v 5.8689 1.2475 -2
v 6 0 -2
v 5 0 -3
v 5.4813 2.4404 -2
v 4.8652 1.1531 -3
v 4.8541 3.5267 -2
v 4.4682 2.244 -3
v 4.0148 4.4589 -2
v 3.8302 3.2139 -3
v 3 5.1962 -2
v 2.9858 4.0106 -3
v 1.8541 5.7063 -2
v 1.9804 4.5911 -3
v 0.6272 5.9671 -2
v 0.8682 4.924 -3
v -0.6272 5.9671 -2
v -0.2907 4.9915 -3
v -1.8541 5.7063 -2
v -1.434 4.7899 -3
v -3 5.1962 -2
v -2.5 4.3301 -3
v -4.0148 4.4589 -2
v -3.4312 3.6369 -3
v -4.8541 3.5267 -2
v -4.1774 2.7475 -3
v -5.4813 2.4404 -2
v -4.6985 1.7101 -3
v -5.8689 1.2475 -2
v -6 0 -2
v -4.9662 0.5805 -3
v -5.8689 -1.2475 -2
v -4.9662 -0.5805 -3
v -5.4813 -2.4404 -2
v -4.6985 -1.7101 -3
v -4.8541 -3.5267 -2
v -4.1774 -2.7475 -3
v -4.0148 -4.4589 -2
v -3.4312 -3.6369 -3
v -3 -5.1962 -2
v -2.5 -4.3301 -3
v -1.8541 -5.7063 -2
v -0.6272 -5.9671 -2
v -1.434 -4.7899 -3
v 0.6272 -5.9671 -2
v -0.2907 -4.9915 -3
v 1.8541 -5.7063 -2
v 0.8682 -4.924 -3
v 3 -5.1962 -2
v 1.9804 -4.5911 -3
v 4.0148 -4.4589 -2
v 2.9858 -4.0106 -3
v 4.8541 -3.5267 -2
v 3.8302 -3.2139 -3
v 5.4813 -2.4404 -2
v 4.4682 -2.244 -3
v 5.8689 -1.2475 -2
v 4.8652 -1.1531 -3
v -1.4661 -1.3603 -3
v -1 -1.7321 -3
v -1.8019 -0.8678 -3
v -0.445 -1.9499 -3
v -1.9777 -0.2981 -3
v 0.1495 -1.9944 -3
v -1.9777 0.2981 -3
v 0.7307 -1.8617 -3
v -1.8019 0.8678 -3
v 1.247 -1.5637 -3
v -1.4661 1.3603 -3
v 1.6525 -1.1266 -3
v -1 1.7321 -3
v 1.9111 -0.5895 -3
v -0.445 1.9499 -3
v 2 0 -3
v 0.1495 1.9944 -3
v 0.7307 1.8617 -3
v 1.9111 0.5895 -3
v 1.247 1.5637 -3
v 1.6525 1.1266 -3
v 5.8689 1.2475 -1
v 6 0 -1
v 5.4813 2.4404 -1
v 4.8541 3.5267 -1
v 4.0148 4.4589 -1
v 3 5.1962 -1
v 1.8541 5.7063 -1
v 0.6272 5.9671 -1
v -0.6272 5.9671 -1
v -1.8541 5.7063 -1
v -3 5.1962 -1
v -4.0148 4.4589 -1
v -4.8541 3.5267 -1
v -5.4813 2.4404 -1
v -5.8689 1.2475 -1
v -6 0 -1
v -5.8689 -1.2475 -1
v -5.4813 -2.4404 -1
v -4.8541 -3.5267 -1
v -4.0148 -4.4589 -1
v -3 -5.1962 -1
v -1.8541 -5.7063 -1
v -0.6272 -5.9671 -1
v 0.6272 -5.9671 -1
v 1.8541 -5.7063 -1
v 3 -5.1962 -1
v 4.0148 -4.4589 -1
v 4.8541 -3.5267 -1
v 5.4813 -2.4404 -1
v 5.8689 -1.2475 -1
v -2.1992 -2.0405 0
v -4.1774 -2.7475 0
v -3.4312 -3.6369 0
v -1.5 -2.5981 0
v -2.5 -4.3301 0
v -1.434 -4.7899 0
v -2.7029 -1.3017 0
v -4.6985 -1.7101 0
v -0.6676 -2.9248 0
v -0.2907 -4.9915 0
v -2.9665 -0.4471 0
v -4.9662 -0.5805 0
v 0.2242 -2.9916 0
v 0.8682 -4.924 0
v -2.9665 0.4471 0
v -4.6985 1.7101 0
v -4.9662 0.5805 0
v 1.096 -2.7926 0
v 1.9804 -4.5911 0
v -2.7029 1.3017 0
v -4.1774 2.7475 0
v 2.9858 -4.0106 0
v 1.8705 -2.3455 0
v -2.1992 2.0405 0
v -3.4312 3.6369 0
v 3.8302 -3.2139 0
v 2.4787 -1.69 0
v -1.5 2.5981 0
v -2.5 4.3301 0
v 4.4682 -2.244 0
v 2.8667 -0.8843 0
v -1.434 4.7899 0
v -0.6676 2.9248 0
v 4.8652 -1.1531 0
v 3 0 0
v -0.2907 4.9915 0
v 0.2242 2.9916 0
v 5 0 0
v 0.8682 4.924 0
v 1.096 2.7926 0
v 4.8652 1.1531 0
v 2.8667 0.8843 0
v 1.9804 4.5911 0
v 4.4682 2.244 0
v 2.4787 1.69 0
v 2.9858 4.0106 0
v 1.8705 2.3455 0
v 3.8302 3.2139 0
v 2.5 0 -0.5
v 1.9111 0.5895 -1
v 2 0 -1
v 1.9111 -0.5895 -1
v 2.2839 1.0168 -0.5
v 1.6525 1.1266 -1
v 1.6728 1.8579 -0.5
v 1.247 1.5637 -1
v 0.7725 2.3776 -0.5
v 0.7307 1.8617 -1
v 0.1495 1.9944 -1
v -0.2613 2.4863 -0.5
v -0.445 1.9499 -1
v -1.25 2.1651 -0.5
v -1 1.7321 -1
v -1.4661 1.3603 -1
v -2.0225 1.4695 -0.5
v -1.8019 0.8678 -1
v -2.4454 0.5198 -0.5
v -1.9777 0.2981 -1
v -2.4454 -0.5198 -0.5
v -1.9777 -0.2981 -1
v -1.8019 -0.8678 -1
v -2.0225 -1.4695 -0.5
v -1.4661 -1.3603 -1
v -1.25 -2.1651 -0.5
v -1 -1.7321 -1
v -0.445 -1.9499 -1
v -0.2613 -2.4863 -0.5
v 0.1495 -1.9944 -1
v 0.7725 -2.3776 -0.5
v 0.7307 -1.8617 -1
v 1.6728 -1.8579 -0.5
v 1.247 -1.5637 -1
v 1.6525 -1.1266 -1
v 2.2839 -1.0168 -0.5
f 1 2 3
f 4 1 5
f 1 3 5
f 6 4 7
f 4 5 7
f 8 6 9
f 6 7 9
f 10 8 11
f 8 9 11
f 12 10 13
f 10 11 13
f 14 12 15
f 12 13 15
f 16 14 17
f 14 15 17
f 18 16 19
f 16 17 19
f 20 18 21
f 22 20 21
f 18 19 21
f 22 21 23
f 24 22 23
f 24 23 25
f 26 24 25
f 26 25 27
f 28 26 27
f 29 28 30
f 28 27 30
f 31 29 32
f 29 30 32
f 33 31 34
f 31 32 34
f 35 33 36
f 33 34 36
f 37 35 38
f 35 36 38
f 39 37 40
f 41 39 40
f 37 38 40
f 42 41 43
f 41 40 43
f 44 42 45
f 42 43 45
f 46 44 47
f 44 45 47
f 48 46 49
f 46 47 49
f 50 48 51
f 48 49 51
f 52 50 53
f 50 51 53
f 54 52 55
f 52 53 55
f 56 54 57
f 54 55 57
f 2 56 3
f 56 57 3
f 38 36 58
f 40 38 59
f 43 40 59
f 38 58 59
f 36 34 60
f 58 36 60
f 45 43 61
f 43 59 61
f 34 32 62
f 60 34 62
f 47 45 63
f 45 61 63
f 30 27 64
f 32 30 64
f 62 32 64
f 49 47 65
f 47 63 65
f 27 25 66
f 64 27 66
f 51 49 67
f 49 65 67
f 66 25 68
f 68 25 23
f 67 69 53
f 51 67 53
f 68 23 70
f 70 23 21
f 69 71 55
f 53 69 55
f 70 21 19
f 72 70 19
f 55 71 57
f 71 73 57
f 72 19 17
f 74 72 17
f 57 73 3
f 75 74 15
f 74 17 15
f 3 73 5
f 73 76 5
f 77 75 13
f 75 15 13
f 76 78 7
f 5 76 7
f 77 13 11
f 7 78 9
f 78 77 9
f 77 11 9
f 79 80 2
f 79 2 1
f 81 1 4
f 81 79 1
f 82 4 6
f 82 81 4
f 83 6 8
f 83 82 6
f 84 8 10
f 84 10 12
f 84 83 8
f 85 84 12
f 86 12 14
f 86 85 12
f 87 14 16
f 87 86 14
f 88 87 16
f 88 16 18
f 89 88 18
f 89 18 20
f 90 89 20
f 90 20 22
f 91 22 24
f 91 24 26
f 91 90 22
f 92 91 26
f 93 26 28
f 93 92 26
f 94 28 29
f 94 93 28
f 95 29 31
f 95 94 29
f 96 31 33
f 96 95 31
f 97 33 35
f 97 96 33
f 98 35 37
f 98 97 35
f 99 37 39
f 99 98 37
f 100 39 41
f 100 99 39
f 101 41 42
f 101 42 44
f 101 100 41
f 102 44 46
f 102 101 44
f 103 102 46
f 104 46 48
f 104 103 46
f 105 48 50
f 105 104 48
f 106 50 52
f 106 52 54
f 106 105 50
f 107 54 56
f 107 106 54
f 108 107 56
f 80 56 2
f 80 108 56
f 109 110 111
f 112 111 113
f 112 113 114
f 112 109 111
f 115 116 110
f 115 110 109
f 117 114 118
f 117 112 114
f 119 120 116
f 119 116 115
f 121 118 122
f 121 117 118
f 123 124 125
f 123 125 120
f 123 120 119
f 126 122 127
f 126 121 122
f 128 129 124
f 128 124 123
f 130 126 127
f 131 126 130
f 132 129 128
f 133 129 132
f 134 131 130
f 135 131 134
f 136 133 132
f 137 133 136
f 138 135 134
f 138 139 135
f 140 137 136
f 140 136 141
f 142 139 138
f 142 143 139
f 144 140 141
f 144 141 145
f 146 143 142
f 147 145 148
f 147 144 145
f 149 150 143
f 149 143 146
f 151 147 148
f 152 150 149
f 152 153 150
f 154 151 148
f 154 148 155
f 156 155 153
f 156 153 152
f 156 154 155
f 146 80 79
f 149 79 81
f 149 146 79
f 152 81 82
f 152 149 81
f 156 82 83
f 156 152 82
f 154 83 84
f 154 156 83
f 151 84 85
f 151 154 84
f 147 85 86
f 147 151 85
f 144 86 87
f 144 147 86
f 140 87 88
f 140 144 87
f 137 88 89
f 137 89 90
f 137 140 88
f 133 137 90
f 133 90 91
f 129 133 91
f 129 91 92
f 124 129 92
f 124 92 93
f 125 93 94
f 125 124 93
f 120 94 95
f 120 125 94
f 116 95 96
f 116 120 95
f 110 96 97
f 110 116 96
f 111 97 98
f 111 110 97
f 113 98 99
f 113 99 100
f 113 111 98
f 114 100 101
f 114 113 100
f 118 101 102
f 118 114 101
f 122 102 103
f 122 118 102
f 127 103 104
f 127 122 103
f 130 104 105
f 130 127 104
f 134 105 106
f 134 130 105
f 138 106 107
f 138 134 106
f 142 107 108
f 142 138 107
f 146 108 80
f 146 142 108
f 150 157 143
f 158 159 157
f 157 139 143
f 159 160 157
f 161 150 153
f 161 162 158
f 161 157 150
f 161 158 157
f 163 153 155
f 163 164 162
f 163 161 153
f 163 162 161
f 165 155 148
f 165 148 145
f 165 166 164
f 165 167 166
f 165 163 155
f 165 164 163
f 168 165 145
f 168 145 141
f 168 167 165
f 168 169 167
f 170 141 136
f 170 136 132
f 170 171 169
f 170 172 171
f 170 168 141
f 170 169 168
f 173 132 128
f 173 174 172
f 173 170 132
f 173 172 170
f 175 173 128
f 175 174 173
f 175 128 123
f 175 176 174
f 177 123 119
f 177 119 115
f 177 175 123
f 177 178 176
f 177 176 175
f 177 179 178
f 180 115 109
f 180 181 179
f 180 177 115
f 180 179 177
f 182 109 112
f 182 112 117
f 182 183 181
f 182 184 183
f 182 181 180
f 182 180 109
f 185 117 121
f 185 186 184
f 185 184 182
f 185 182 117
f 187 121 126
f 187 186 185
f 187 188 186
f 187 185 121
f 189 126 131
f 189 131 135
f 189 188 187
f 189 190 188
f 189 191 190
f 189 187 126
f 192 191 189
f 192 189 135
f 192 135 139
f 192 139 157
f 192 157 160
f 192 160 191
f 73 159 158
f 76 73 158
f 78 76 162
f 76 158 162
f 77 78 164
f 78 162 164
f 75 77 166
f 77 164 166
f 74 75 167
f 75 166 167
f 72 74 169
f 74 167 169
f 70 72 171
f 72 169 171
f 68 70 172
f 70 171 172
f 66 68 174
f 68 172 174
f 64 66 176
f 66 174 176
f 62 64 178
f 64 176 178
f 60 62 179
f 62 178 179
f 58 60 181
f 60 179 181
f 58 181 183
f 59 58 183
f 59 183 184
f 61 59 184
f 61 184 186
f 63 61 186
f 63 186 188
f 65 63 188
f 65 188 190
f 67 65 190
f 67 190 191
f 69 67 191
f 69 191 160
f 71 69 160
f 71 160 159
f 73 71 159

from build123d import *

# Parameters (mm, degrees)
ESQUISSE1_R             = 6
BASE_EXTRUSION_DEPTH    = 3
CHANFREIN1_SIZE         = 1
ESQUISSE2_R             = 2
ENL_V_MAT_EXTRU_1_DEPTH = 10
CHANFREIN3_SIZE         = 1


with BuildPart() as part:
    # Esquisse1 → Base-Extrusion (new body)
    with BuildSketch(Plane.XY):
        Circle(ESQUISSE1_R)
    extrude(amount=-BASE_EXTRUSION_DEPTH)

    # Chanfrein1
    chanfrein1_edges = [part.edges().sort_by_distance(p)[0] for p in [
        (-6, 0, 0),
        (-6, 0, -3),
    ]]
    chamfer(chanfrein1_edges, length=CHANFREIN1_SIZE)

    # Esquisse2 → Enlèv. mat.-Extru.1 (cut, through all)
    with BuildSketch(Plane.XY):
        Circle(ESQUISSE2_R)
    extrude(amount=-ENL_V_MAT_EXTRU_1_DEPTH, mode=Mode.SUBTRACT)

    # Chanfrein3
    chanfrein3_edges = [part.edges().sort_by_distance(p)[0] for p in [
        (-2, 0, 0),
    ]]
    chamfer(chanfrein3_edges, length=CHANFREIN3_SIZE)


solid = part.part
